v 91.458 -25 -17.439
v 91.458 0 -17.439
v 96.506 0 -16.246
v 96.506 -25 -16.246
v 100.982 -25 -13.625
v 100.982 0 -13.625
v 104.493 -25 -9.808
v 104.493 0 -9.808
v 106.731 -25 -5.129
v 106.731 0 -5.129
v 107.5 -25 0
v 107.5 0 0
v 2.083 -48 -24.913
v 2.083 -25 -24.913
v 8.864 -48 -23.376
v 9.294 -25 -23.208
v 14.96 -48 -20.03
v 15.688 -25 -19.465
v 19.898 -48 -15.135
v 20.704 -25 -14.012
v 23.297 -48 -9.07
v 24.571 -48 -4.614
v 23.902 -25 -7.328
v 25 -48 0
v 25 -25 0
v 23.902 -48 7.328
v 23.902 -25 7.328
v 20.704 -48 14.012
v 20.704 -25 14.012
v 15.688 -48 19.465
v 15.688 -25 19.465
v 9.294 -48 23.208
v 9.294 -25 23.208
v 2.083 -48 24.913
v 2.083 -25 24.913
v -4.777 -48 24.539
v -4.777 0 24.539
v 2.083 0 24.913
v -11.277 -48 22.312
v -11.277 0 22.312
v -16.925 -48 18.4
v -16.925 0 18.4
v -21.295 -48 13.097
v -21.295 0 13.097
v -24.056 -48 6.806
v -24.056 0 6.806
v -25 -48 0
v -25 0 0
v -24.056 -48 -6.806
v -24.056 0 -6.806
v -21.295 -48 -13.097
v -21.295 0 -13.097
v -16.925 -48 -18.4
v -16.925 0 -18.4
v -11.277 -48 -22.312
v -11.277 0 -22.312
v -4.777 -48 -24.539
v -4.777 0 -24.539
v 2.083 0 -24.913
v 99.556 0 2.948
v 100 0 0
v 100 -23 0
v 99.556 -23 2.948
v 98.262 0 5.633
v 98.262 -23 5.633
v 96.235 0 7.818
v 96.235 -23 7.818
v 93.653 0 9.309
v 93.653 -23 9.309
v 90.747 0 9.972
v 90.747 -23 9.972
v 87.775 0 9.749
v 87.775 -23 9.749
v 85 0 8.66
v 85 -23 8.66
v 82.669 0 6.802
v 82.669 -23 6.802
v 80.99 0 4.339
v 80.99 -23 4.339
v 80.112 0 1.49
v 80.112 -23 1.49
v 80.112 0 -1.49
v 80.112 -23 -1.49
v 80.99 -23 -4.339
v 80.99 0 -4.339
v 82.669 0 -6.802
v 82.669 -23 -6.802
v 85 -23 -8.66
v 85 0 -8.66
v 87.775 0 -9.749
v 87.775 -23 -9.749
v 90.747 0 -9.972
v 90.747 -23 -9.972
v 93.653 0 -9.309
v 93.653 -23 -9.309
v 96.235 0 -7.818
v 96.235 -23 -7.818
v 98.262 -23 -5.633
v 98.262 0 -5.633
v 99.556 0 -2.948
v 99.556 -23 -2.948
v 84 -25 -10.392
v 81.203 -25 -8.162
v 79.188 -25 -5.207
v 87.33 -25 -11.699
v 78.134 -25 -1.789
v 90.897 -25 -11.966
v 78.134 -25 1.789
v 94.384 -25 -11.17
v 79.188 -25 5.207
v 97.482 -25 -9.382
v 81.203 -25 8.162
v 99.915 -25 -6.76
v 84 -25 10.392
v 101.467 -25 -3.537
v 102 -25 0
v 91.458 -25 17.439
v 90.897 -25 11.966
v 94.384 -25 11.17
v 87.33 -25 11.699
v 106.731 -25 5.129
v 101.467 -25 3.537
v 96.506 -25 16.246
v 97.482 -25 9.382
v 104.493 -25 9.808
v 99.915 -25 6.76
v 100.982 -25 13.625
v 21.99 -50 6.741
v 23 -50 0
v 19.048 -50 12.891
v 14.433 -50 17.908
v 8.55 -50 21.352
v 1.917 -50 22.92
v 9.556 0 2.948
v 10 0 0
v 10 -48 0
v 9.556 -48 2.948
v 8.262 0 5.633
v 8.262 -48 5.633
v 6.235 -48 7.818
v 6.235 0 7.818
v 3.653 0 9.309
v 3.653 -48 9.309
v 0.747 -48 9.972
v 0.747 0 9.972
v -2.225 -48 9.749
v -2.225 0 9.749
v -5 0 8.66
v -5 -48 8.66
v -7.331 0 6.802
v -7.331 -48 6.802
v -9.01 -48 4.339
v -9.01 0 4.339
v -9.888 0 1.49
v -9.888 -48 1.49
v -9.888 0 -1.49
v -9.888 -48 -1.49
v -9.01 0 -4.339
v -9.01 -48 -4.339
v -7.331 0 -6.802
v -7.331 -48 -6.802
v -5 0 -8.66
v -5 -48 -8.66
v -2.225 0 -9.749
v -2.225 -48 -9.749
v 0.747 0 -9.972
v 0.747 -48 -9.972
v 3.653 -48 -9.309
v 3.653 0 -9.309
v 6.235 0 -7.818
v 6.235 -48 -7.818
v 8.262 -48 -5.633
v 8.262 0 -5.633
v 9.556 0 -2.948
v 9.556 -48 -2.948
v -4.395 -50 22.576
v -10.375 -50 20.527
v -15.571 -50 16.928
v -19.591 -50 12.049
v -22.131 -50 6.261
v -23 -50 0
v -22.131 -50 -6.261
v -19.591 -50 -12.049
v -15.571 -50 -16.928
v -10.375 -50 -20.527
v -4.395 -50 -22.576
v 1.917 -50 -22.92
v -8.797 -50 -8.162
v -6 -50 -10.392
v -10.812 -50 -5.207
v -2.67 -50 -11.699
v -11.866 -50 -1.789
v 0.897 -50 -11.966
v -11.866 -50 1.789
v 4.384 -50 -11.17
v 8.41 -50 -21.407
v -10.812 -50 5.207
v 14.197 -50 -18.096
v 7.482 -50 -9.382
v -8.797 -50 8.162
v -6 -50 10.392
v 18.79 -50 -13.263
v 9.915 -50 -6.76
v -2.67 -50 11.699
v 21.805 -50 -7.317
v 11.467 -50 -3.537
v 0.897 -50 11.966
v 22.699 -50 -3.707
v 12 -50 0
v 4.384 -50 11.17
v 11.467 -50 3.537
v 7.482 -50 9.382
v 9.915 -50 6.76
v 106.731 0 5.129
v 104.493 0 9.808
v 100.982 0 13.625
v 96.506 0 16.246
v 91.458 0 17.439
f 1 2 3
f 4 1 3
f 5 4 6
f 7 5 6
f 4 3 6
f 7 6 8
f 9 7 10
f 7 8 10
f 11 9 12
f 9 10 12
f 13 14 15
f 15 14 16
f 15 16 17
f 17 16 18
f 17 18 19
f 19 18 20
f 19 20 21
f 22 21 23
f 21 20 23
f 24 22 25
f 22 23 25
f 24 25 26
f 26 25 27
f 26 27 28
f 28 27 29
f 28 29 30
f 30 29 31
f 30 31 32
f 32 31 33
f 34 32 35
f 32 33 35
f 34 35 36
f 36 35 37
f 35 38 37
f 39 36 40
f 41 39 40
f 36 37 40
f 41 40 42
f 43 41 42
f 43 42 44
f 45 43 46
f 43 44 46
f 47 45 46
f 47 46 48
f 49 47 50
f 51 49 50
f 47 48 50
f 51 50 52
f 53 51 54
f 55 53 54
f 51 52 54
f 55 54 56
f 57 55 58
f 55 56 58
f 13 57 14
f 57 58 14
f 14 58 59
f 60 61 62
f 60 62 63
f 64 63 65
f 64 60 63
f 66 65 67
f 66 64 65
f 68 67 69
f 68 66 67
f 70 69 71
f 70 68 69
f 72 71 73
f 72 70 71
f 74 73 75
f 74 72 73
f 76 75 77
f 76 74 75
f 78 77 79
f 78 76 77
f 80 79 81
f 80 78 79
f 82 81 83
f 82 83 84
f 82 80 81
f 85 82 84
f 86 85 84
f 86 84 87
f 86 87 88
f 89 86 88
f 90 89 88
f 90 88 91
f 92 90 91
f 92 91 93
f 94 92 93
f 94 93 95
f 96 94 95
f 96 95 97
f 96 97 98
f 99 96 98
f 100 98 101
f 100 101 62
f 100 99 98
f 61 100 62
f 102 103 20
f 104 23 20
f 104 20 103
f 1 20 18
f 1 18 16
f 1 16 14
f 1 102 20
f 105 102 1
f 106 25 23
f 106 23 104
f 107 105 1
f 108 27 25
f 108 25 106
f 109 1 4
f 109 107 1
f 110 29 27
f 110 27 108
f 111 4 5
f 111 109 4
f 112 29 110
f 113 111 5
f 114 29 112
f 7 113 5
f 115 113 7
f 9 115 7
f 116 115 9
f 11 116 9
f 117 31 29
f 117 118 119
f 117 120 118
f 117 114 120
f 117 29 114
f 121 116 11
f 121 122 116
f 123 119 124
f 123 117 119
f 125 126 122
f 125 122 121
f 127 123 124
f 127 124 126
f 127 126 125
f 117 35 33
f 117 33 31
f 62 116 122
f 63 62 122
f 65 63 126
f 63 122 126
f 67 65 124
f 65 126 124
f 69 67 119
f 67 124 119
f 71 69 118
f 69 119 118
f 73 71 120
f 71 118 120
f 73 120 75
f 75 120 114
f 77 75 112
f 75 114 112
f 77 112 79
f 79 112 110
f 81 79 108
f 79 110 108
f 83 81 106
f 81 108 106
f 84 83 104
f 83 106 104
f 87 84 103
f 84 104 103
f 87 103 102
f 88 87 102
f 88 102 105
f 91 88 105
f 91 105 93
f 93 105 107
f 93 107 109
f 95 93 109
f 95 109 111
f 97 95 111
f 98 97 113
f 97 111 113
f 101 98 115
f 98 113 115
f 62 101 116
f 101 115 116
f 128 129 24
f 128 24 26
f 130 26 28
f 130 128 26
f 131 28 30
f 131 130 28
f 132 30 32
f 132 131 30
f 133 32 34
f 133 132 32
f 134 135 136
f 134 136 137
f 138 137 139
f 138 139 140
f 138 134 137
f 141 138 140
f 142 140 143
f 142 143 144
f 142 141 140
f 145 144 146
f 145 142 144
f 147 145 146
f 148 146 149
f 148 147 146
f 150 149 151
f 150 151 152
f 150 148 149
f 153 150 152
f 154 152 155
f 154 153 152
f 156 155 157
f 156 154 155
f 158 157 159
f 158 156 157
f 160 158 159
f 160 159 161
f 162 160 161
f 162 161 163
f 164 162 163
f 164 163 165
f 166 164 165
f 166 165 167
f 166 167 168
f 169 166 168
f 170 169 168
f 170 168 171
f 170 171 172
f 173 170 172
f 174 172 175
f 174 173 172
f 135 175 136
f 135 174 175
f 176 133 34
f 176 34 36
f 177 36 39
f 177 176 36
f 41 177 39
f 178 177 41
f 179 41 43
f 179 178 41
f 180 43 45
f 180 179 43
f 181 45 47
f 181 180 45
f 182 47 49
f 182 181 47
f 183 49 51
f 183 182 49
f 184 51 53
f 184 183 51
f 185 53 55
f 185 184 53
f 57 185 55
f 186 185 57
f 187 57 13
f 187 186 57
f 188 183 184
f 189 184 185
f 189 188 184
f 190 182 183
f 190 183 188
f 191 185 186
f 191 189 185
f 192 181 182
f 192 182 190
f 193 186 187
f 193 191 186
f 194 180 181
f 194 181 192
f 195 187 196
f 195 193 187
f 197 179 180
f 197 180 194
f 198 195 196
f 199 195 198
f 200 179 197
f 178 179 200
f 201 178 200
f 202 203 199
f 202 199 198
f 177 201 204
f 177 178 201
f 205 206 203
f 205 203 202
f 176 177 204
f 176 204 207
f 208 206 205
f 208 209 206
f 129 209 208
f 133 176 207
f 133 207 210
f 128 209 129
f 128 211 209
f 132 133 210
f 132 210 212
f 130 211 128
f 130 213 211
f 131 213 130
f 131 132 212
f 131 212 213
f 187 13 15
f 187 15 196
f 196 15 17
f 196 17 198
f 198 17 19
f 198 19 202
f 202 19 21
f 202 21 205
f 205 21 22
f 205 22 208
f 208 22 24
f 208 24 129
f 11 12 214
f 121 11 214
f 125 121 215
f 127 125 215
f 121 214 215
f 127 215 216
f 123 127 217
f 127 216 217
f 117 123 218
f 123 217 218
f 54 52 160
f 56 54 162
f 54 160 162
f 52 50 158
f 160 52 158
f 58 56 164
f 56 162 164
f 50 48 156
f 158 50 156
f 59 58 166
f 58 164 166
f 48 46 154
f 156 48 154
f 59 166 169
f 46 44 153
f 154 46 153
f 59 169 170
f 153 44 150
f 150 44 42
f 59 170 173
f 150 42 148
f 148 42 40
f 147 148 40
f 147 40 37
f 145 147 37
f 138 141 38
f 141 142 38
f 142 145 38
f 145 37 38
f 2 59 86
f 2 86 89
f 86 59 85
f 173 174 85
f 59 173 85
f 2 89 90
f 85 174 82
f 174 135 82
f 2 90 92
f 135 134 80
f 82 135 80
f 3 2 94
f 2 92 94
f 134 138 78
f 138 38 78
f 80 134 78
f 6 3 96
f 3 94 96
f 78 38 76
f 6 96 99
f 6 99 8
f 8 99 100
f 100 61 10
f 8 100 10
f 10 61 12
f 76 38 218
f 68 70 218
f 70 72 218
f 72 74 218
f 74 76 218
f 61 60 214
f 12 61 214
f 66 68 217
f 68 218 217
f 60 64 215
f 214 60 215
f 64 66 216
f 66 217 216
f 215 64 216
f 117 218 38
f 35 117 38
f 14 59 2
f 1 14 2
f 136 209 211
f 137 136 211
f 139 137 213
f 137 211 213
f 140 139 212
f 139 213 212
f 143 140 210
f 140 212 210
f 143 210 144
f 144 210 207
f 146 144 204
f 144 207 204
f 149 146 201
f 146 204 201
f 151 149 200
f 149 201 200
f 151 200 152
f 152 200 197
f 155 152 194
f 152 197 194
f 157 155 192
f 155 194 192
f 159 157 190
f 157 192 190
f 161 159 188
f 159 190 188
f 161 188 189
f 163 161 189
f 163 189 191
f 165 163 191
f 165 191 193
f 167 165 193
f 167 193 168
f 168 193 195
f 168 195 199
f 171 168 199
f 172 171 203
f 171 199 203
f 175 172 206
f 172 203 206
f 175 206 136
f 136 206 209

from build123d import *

# Parameters (mm, degrees)
F0_R     = 10
F1_DEPTH = 25
F2_DEPTH = 50
F3_SIZE  = 2


# Not quite as in the source:
# - the program builds the solid bodies; features that only make, move or delete a surface that nothing else refers to are left out


with BuildPart() as f1:
    # F0 (on Front) → F1 (new body)
    with BuildSketch(Plane.XZ):
        with BuildLine():
            ThreePointArc((2.0833333333, -24.9130432148), (18.3995018048, -16.9250800097), (25, 0))
            ThreePointArc((25, 0), (18.3995018048, 16.9250800097), (2.0833333333, 24.9130432148))
            ThreePointArc((2.0833333333, 24.9130432148), (-25, 0), (2.0833333333, -24.9130432148))
        make_face()
        Circle(F0_R, mode=Mode.SUBTRACT)
        with BuildLine():
            ThreePointArc((2.0833333333, 24.9130432148), (18.3995018048, 16.9250800097), (25, 0))
            ThreePointArc((25, 0), (18.3995018048, -16.9250800097), (2.0833333333, -24.9130432148))
            Line((2.0833333333, -24.9130432148), (91.4583333333, -17.4391302504))
            ThreePointArc((91.4583333333, -17.4391302504), (72.5, 0), (91.4583333333, 17.4391302504))
            Line((91.4583333333, 17.4391302504), (2.0833333333, 24.9130432148))
        make_face()
        with BuildLine():
            ThreePointArc((107.5, 0), (102.8796512634, 11.8475560068), (91.4583333333, 17.4391302504))
            ThreePointArc((91.4583333333, 17.4391302504), (72.5, 0), (91.4583333333, -17.4391302504))
            ThreePointArc((91.4583333333, -17.4391302504), (102.8796512634, -11.8475560068), (107.5, 0))
        make_face()
        with Locations((90, 0)):
            Circle(F0_R, mode=Mode.SUBTRACT)
    extrude(amount=F1_DEPTH)

    # F0 (on Front) → F2 (join)
    with BuildSketch(Plane.XZ):
        with BuildLine():
            ThreePointArc((2.0833333333, -24.9130432148), (18.3995018048, -16.9250800097), (25, 0))
            ThreePointArc((25, 0), (18.3995018048, 16.9250800097), (2.0833333333, 24.9130432148))
            ThreePointArc((2.0833333333, 24.9130432148), (-25, 0), (2.0833333333, -24.9130432148))
        make_face()
        Circle(F0_R, mode=Mode.SUBTRACT)
    extrude(amount=F2_DEPTH)

    # F3
    f3_edges = [f1.edges().sort_by_distance(p)[0] for p in [
        (-2.083333, -50, 24.913043),
        (-10, -50, 0),
        (80, -25, 0),
    ]]
    chamfer(f3_edges, length=F3_SIZE)


solid = f1.part
